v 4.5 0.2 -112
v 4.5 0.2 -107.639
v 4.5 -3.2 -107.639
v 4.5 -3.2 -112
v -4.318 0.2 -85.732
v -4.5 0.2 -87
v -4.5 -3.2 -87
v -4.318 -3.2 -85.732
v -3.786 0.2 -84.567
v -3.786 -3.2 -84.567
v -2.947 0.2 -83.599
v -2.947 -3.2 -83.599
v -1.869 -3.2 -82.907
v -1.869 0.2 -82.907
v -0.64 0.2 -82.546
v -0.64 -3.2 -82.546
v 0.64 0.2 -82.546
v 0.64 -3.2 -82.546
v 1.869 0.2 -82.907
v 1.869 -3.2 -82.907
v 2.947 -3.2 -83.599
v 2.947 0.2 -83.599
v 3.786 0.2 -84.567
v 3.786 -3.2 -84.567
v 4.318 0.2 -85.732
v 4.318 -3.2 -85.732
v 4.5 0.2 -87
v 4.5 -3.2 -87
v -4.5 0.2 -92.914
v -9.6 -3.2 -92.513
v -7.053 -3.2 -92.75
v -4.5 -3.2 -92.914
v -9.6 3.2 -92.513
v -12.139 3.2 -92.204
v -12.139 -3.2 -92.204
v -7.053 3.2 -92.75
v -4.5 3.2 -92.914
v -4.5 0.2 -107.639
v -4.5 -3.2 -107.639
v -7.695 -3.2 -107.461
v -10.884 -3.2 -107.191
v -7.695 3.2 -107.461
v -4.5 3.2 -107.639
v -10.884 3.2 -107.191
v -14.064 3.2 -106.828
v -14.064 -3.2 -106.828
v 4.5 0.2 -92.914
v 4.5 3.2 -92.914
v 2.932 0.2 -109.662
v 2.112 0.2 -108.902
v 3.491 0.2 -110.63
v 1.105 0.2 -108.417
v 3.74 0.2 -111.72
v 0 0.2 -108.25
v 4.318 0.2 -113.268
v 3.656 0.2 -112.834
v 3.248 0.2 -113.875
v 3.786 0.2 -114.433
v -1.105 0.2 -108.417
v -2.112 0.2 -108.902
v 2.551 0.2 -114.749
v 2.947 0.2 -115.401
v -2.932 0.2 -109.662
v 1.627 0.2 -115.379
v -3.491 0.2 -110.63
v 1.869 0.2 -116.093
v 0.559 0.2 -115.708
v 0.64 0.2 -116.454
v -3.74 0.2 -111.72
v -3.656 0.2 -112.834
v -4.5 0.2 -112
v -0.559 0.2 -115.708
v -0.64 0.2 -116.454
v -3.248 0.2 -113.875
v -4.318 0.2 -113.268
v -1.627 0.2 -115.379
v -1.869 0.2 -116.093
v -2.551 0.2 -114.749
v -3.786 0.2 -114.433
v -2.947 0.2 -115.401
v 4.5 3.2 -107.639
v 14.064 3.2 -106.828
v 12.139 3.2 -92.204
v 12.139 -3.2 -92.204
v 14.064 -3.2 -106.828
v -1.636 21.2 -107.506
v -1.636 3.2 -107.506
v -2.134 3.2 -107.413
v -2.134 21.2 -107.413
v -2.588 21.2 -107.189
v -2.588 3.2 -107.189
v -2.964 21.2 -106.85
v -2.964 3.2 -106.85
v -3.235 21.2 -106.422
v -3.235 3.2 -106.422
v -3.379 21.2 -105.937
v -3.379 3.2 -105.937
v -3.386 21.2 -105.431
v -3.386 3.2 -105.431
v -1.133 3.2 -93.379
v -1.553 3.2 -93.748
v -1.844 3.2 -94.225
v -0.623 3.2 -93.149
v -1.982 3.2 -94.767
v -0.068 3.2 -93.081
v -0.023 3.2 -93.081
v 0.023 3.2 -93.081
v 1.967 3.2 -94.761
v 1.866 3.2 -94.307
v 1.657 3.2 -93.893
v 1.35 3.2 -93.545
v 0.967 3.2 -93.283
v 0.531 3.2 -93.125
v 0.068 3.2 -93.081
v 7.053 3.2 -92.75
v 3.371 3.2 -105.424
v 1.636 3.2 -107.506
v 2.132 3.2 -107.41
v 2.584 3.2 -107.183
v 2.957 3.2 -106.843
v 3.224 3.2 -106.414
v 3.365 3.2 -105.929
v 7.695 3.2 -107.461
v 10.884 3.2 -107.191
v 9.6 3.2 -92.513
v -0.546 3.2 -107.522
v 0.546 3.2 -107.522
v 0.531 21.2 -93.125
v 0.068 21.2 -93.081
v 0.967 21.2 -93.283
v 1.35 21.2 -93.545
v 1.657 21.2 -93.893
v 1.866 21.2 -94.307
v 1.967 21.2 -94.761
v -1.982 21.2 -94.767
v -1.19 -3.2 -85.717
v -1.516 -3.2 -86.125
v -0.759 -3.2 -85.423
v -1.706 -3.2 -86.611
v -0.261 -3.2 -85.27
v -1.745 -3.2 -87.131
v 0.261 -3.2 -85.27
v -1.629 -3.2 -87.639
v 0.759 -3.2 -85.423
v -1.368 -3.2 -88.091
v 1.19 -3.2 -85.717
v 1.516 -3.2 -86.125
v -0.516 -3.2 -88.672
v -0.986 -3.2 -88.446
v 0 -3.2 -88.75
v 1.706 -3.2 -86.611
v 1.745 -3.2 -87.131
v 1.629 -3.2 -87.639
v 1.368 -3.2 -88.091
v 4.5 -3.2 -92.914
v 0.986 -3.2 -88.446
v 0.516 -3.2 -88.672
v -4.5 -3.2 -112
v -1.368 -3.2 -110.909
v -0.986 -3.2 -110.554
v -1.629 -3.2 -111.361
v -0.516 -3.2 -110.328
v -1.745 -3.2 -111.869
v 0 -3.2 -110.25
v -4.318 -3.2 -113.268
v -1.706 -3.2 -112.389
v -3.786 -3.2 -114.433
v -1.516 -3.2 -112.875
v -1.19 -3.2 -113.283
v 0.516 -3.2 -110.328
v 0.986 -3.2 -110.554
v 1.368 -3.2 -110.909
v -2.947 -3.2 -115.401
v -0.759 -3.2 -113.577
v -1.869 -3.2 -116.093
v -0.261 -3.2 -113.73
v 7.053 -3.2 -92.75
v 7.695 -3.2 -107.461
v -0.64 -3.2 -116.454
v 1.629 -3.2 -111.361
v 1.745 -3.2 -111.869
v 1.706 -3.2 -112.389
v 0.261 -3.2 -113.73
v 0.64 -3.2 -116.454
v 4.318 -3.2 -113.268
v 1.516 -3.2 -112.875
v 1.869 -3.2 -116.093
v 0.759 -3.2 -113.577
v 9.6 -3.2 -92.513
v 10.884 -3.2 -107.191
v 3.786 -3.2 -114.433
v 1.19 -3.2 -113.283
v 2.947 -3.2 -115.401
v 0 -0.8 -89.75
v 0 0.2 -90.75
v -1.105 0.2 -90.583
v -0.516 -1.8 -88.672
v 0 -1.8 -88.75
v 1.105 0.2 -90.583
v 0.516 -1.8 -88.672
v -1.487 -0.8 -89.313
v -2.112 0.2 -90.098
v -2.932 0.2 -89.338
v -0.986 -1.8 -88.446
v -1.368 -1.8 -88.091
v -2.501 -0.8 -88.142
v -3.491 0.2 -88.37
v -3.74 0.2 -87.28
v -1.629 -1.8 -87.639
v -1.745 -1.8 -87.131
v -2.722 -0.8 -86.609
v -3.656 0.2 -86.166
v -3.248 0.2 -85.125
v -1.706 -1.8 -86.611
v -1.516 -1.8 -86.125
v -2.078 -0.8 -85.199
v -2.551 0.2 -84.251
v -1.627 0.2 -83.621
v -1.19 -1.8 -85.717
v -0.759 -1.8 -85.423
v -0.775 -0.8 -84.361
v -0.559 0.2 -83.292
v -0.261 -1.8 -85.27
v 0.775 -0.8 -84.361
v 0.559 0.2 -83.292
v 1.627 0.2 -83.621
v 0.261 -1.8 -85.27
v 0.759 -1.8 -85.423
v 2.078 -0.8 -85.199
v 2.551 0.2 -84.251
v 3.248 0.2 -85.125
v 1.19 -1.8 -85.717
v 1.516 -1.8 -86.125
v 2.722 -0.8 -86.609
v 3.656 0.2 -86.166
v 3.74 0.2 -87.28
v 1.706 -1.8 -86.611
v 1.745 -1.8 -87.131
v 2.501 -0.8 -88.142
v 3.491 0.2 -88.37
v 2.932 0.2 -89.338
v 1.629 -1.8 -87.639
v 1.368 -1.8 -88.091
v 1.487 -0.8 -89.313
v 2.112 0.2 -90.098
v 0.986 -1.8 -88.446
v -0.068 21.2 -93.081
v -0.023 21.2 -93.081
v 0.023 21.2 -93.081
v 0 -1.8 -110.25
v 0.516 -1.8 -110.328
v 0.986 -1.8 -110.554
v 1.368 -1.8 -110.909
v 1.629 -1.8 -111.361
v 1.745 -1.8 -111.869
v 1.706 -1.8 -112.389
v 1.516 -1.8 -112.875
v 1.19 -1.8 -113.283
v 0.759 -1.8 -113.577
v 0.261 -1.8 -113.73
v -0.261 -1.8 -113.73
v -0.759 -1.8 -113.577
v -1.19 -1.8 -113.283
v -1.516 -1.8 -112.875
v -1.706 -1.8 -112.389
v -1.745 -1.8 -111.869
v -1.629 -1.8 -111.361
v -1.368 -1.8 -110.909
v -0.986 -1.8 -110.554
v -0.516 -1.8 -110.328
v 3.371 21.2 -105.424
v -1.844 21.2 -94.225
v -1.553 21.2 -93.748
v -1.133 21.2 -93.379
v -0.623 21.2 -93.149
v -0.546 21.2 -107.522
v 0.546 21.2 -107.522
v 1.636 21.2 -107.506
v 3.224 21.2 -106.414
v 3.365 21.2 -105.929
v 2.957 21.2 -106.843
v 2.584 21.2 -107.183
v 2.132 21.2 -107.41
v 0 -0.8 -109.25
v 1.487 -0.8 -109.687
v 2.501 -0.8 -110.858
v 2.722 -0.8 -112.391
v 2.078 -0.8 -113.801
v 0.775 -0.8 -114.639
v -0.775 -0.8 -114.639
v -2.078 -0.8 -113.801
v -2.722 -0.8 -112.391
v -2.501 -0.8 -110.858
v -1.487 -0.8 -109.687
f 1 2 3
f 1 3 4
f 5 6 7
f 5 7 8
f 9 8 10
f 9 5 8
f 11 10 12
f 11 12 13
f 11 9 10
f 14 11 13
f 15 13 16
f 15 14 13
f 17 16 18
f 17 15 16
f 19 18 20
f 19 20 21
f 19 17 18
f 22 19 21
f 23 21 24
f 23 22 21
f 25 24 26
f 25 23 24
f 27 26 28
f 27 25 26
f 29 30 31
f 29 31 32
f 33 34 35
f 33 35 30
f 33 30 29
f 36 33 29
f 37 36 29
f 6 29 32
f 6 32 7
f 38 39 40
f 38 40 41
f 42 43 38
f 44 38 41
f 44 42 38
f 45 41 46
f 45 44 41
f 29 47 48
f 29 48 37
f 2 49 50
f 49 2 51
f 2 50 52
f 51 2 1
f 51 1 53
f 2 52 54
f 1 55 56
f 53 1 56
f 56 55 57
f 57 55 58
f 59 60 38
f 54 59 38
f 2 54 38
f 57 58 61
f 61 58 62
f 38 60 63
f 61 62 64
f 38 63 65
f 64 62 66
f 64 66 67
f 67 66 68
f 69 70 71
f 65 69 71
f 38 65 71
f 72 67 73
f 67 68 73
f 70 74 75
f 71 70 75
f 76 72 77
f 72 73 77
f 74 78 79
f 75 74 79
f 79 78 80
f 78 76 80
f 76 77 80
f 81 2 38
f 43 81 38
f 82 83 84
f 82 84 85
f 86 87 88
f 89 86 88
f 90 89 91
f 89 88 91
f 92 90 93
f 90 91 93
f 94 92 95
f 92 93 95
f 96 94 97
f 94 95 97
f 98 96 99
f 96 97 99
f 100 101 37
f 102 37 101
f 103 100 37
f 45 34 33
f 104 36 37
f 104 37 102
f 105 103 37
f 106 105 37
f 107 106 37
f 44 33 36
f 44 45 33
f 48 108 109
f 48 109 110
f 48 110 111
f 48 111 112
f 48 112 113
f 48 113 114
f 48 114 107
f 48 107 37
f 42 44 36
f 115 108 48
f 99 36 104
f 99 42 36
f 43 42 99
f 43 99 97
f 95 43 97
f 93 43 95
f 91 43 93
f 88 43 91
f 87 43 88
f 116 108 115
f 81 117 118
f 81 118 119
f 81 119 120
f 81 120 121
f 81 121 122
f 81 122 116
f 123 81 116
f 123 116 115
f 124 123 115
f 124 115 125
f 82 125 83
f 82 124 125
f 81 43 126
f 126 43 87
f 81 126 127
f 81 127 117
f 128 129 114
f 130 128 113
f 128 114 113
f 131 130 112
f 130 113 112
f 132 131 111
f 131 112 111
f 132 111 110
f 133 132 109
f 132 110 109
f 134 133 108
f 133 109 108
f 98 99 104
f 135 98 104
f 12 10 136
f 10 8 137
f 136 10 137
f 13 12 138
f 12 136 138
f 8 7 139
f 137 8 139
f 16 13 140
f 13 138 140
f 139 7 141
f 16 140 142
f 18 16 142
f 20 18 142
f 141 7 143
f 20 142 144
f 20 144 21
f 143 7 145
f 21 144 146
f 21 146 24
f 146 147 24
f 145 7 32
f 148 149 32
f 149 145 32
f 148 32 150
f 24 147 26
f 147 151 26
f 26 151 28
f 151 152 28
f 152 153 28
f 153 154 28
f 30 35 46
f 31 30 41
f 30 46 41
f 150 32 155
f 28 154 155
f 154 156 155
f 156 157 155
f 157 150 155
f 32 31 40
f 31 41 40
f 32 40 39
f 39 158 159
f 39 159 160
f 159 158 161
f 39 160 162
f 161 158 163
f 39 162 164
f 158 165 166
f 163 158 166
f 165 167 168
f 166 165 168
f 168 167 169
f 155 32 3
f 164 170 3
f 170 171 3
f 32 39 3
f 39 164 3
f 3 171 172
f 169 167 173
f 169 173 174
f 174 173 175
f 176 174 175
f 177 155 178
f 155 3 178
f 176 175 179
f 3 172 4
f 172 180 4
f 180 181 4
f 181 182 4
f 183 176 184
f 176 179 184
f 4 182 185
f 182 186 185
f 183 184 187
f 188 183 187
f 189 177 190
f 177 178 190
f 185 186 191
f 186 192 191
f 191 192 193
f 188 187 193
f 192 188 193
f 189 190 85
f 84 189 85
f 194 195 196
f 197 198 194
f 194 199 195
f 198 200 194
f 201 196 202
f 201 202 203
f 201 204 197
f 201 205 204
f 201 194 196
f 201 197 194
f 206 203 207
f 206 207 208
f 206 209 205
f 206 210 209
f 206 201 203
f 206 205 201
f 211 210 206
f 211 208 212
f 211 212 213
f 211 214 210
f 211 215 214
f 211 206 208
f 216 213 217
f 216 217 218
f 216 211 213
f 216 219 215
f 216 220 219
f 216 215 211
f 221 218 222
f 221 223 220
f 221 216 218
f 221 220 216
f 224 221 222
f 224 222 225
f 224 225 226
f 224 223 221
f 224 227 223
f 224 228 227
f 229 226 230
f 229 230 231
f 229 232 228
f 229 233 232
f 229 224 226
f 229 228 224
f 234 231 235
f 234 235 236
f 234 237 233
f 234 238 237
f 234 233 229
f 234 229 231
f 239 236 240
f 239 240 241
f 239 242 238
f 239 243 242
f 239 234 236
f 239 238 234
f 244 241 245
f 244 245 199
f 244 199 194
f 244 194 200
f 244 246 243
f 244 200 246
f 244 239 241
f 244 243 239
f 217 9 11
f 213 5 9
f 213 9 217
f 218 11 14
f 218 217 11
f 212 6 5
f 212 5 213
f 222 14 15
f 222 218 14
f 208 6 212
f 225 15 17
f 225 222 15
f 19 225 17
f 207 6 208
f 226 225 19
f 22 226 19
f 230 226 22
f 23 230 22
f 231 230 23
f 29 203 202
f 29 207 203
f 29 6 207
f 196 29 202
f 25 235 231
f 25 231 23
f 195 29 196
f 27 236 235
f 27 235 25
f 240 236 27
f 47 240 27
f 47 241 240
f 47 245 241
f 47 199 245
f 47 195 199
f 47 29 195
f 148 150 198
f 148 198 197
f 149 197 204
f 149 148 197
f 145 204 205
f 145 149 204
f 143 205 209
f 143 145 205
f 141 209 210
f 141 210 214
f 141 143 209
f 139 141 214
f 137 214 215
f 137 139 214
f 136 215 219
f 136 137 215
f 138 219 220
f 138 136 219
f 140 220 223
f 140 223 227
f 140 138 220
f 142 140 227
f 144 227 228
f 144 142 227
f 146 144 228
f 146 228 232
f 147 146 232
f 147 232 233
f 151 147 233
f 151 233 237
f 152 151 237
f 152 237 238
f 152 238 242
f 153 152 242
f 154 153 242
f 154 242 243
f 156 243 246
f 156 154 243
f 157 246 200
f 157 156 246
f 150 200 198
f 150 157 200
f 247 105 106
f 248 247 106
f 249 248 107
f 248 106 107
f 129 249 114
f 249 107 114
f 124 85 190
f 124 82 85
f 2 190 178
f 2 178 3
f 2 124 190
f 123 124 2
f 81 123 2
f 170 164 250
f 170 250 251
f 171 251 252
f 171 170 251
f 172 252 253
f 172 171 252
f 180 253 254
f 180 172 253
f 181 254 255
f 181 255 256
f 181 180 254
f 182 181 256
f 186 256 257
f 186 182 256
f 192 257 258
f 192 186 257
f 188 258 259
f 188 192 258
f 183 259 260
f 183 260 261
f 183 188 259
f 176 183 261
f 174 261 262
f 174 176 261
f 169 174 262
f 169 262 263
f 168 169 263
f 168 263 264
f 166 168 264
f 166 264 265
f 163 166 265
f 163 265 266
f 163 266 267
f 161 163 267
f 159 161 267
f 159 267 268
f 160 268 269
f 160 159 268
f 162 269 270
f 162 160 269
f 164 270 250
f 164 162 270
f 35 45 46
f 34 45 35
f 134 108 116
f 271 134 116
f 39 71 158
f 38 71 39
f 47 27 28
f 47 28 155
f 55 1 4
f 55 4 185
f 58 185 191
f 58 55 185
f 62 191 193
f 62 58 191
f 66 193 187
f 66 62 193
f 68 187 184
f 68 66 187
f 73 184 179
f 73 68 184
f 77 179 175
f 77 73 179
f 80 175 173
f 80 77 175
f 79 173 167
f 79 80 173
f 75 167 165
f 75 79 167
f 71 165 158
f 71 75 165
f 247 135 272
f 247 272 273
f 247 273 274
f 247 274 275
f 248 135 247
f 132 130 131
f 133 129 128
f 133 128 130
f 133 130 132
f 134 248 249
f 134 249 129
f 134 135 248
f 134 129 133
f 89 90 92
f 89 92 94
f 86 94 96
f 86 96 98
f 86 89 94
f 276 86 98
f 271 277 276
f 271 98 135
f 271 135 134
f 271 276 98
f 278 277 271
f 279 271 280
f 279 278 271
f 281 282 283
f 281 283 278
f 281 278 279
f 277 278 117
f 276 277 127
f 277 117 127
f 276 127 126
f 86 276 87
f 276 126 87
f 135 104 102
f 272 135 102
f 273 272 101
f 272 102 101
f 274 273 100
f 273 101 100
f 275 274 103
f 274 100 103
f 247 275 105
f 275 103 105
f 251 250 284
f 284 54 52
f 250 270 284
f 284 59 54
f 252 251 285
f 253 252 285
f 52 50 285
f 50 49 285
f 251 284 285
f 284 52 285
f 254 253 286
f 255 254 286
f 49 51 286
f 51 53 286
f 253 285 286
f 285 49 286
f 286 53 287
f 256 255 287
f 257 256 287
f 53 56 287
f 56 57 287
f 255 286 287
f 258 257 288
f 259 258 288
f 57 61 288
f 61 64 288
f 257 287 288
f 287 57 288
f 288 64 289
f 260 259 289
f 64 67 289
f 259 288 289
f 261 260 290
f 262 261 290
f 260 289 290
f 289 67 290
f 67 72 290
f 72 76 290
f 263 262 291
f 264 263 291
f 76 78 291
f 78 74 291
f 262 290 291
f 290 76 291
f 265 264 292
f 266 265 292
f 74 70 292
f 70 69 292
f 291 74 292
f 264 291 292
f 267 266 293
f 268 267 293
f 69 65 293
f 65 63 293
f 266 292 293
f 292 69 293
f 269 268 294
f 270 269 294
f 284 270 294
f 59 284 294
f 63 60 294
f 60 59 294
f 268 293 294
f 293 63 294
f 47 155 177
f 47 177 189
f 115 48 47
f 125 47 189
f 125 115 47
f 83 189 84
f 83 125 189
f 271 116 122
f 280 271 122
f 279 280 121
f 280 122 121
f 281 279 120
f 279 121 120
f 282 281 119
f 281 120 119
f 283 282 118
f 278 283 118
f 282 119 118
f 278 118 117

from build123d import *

# Parameters (mm, degrees)
SKETCH1_R                = 1.75
BOSS_EXTRUDE1_DEPTH      = 3.2
BOSS_EXTRUDE2_DEPTH      = 18
BOSS_EXTRUDE2_DEPTH_BACK = 6.4
CUT_EXTRUDE1_DEPTH       = 119.718371128
CUT_EXTRUDE1_DEPTH_BACK  = 3
SKETCH4_R                = 1.75
CHAMFER1_SIZE            = 2


with BuildPart() as part:
    # Sketch1 → Boss-Extrude1 (new, symmetric)
    with BuildSketch(Plane(origin=(0, 0, 0), x_dir=(1, 0, 0), z_dir=(0, 1, 0))):
        with BuildLine():
            Line((-14.064197212, 106.828183813), (-12.138935876, 92.204372108))
            ThreePointArc((-12.138935876, 92.204372108), (-8.327034738, 92.640714043), (-4.5, 92.914191088))
            Line((-4.5, 92.914191088), (-4.5, 90.60548378))
            Line((-4.5, 90.60548378), (-4.5, 89.092083998))
            Line((-4.5, 89.092083998), (-4.5, 87))
            ThreePointArc((-4.5, 87), (0, 82.5), (4.5, 87))
            Line((4.5, 87), (4.5, 89.092083998))
            Line((4.5, 89.092083998), (4.5, 90.60548378))
            Line((4.5, 90.60548378), (4.5, 92.914191088))
            ThreePointArc((4.5, 92.914191088), (8.327034738, 92.640714043), (12.138935876, 92.204372108))
            Line((12.138935876, 92.204372108), (14.064197212, 106.828183813))
            ThreePointArc((14.064197212, 106.828183813), (9.290945642, 107.337913445), (4.5, 107.638902983))
            Line((4.5, 107.638902983), (4.5, 109.907916002))
            Line((4.5, 109.907916002), (4.5, 112))
            ThreePointArc((4.5, 112), (0, 116.5), (-4.5, 112))
            Line((-4.5, 112), (-4.5, 109.907916002))
            Line((-4.5, 109.907916002), (-4.5, 107.638902983))
            ThreePointArc((-4.5, 107.638902983), (-9.290945642, 107.337913445), (-14.064197212, 106.828183813))
        make_face()
        with Locations(Location((0, 112, 0), (0, 0, 270))):
            Circle(SKETCH1_R, mode=Mode.SUBTRACT)
        with Locations(Location((0, 87, 0), (0, 0, 90))):
            Circle(SKETCH1_R, mode=Mode.SUBTRACT)
    extrude(amount=BOSS_EXTRUDE1_DEPTH, both=True)

    # Sketch3 → Boss-Extrude2 (add, two sides: drawn at the far end of the back side and taken through both)
    with BuildSketch(Plane(origin=(0, 3.2, 0), x_dir=(1, 0, 0), z_dir=(0, 1, 0)).offset(-BOSS_EXTRUDE2_DEPTH_BACK)):
        with BuildLine():
            Line((1.966607271, 94.760679154), (3.370522681, 105.424475409))
            ThreePointArc((3.370522681, 105.424475409), (2.956747146, 106.842837192), (1.636401853, 107.505897258))
            ThreePointArc((1.636401853, 107.505897258), (0, 107.524356631), (-1.636401853, 107.505897258))
            ThreePointArc((-1.636401853, 107.505897258), (-2.964387866, 106.850395337), (-3.385996272, 105.430720736))
            Line((-3.385996272, 105.430720736), (-1.982080861, 94.766924481))
            ThreePointArc((-1.982080861, 94.766924481), (-1.356871712, 93.547573592), (-0.06849064, 93.080907451))
            ThreePointArc((-0.06849064, 93.080907451), (0, 93.080930849), (0.06849064, 93.080907451))
            ThreePointArc((0.06849064, 93.080907451), (1.350413288, 93.544661639), (1.966607271, 94.760679154))
        make_face()
    extrude(amount=BOSS_EXTRUDE2_DEPTH + BOSS_EXTRUDE2_DEPTH_BACK)

    # Sketch4 → Cut-Extrude1 (cut, two sides: drawn at the far end of the back side and taken through both)
    # profile 1 of 2: a face of its own
    with BuildSketch(Plane(origin=(0, 3.2, 0), x_dir=(1, 0, 0), z_dir=(0, 1, 0)).offset(-CUT_EXTRUDE1_DEPTH_BACK)):
        with BuildLine():
            Line((-4.5, 91.393652938), (-4.5, 87.032555921))
            ThreePointArc((-4.5, 87.032555921), (0, 82.41632562), (4.5, 87.032555921))
            Line((4.5, 87.032555921), (4.5, 91.393652938))
            Line((4.5, 91.393652938), (4.5, 92.914191088))
            Line((4.5, 92.914191088), (-4.5, 92.914191088))
            Line((-4.5, 92.914191088), (-4.5, 91.393652938))
        make_face()
        with Locations(Location((0, 87, 0), (0, 0, 90))):
            Circle(SKETCH4_R, mode=Mode.SUBTRACT)
    # profile 2 of 2: a face of its own
    with BuildSketch(Plane(origin=(0, 3.2, 0), x_dir=(1, 0, 0), z_dir=(0, 1, 0)).offset(-CUT_EXTRUDE1_DEPTH_BACK)):
        with BuildLine():
            Line((4.5, 107.638902983), (-4.5, 107.638902983))
            Line((-4.5, 107.638902983), (-4.5, 112))
            ThreePointArc((-4.5, 112), (0, 116.5), (4.5, 112))
            Line((4.5, 112), (4.5, 107.638902983))
        make_face()
        with Locations(Location((0, 112, 0), (0, 0, 270))):
            Circle(SKETCH4_R, mode=Mode.SUBTRACT)
    extrude(amount=CUT_EXTRUDE1_DEPTH + CUT_EXTRUDE1_DEPTH_BACK, mode=Mode.SUBTRACT)

    # Chamfer1
    chamfer1_edges = [part.edges().sort_by_distance(p)[0] for p in [
        (0, 0.2, -85.25),
        (0, 0.2, -113.75),
    ]]
    chamfer(chamfer1_edges, length=CHAMFER1_SIZE)


solid = part.part
